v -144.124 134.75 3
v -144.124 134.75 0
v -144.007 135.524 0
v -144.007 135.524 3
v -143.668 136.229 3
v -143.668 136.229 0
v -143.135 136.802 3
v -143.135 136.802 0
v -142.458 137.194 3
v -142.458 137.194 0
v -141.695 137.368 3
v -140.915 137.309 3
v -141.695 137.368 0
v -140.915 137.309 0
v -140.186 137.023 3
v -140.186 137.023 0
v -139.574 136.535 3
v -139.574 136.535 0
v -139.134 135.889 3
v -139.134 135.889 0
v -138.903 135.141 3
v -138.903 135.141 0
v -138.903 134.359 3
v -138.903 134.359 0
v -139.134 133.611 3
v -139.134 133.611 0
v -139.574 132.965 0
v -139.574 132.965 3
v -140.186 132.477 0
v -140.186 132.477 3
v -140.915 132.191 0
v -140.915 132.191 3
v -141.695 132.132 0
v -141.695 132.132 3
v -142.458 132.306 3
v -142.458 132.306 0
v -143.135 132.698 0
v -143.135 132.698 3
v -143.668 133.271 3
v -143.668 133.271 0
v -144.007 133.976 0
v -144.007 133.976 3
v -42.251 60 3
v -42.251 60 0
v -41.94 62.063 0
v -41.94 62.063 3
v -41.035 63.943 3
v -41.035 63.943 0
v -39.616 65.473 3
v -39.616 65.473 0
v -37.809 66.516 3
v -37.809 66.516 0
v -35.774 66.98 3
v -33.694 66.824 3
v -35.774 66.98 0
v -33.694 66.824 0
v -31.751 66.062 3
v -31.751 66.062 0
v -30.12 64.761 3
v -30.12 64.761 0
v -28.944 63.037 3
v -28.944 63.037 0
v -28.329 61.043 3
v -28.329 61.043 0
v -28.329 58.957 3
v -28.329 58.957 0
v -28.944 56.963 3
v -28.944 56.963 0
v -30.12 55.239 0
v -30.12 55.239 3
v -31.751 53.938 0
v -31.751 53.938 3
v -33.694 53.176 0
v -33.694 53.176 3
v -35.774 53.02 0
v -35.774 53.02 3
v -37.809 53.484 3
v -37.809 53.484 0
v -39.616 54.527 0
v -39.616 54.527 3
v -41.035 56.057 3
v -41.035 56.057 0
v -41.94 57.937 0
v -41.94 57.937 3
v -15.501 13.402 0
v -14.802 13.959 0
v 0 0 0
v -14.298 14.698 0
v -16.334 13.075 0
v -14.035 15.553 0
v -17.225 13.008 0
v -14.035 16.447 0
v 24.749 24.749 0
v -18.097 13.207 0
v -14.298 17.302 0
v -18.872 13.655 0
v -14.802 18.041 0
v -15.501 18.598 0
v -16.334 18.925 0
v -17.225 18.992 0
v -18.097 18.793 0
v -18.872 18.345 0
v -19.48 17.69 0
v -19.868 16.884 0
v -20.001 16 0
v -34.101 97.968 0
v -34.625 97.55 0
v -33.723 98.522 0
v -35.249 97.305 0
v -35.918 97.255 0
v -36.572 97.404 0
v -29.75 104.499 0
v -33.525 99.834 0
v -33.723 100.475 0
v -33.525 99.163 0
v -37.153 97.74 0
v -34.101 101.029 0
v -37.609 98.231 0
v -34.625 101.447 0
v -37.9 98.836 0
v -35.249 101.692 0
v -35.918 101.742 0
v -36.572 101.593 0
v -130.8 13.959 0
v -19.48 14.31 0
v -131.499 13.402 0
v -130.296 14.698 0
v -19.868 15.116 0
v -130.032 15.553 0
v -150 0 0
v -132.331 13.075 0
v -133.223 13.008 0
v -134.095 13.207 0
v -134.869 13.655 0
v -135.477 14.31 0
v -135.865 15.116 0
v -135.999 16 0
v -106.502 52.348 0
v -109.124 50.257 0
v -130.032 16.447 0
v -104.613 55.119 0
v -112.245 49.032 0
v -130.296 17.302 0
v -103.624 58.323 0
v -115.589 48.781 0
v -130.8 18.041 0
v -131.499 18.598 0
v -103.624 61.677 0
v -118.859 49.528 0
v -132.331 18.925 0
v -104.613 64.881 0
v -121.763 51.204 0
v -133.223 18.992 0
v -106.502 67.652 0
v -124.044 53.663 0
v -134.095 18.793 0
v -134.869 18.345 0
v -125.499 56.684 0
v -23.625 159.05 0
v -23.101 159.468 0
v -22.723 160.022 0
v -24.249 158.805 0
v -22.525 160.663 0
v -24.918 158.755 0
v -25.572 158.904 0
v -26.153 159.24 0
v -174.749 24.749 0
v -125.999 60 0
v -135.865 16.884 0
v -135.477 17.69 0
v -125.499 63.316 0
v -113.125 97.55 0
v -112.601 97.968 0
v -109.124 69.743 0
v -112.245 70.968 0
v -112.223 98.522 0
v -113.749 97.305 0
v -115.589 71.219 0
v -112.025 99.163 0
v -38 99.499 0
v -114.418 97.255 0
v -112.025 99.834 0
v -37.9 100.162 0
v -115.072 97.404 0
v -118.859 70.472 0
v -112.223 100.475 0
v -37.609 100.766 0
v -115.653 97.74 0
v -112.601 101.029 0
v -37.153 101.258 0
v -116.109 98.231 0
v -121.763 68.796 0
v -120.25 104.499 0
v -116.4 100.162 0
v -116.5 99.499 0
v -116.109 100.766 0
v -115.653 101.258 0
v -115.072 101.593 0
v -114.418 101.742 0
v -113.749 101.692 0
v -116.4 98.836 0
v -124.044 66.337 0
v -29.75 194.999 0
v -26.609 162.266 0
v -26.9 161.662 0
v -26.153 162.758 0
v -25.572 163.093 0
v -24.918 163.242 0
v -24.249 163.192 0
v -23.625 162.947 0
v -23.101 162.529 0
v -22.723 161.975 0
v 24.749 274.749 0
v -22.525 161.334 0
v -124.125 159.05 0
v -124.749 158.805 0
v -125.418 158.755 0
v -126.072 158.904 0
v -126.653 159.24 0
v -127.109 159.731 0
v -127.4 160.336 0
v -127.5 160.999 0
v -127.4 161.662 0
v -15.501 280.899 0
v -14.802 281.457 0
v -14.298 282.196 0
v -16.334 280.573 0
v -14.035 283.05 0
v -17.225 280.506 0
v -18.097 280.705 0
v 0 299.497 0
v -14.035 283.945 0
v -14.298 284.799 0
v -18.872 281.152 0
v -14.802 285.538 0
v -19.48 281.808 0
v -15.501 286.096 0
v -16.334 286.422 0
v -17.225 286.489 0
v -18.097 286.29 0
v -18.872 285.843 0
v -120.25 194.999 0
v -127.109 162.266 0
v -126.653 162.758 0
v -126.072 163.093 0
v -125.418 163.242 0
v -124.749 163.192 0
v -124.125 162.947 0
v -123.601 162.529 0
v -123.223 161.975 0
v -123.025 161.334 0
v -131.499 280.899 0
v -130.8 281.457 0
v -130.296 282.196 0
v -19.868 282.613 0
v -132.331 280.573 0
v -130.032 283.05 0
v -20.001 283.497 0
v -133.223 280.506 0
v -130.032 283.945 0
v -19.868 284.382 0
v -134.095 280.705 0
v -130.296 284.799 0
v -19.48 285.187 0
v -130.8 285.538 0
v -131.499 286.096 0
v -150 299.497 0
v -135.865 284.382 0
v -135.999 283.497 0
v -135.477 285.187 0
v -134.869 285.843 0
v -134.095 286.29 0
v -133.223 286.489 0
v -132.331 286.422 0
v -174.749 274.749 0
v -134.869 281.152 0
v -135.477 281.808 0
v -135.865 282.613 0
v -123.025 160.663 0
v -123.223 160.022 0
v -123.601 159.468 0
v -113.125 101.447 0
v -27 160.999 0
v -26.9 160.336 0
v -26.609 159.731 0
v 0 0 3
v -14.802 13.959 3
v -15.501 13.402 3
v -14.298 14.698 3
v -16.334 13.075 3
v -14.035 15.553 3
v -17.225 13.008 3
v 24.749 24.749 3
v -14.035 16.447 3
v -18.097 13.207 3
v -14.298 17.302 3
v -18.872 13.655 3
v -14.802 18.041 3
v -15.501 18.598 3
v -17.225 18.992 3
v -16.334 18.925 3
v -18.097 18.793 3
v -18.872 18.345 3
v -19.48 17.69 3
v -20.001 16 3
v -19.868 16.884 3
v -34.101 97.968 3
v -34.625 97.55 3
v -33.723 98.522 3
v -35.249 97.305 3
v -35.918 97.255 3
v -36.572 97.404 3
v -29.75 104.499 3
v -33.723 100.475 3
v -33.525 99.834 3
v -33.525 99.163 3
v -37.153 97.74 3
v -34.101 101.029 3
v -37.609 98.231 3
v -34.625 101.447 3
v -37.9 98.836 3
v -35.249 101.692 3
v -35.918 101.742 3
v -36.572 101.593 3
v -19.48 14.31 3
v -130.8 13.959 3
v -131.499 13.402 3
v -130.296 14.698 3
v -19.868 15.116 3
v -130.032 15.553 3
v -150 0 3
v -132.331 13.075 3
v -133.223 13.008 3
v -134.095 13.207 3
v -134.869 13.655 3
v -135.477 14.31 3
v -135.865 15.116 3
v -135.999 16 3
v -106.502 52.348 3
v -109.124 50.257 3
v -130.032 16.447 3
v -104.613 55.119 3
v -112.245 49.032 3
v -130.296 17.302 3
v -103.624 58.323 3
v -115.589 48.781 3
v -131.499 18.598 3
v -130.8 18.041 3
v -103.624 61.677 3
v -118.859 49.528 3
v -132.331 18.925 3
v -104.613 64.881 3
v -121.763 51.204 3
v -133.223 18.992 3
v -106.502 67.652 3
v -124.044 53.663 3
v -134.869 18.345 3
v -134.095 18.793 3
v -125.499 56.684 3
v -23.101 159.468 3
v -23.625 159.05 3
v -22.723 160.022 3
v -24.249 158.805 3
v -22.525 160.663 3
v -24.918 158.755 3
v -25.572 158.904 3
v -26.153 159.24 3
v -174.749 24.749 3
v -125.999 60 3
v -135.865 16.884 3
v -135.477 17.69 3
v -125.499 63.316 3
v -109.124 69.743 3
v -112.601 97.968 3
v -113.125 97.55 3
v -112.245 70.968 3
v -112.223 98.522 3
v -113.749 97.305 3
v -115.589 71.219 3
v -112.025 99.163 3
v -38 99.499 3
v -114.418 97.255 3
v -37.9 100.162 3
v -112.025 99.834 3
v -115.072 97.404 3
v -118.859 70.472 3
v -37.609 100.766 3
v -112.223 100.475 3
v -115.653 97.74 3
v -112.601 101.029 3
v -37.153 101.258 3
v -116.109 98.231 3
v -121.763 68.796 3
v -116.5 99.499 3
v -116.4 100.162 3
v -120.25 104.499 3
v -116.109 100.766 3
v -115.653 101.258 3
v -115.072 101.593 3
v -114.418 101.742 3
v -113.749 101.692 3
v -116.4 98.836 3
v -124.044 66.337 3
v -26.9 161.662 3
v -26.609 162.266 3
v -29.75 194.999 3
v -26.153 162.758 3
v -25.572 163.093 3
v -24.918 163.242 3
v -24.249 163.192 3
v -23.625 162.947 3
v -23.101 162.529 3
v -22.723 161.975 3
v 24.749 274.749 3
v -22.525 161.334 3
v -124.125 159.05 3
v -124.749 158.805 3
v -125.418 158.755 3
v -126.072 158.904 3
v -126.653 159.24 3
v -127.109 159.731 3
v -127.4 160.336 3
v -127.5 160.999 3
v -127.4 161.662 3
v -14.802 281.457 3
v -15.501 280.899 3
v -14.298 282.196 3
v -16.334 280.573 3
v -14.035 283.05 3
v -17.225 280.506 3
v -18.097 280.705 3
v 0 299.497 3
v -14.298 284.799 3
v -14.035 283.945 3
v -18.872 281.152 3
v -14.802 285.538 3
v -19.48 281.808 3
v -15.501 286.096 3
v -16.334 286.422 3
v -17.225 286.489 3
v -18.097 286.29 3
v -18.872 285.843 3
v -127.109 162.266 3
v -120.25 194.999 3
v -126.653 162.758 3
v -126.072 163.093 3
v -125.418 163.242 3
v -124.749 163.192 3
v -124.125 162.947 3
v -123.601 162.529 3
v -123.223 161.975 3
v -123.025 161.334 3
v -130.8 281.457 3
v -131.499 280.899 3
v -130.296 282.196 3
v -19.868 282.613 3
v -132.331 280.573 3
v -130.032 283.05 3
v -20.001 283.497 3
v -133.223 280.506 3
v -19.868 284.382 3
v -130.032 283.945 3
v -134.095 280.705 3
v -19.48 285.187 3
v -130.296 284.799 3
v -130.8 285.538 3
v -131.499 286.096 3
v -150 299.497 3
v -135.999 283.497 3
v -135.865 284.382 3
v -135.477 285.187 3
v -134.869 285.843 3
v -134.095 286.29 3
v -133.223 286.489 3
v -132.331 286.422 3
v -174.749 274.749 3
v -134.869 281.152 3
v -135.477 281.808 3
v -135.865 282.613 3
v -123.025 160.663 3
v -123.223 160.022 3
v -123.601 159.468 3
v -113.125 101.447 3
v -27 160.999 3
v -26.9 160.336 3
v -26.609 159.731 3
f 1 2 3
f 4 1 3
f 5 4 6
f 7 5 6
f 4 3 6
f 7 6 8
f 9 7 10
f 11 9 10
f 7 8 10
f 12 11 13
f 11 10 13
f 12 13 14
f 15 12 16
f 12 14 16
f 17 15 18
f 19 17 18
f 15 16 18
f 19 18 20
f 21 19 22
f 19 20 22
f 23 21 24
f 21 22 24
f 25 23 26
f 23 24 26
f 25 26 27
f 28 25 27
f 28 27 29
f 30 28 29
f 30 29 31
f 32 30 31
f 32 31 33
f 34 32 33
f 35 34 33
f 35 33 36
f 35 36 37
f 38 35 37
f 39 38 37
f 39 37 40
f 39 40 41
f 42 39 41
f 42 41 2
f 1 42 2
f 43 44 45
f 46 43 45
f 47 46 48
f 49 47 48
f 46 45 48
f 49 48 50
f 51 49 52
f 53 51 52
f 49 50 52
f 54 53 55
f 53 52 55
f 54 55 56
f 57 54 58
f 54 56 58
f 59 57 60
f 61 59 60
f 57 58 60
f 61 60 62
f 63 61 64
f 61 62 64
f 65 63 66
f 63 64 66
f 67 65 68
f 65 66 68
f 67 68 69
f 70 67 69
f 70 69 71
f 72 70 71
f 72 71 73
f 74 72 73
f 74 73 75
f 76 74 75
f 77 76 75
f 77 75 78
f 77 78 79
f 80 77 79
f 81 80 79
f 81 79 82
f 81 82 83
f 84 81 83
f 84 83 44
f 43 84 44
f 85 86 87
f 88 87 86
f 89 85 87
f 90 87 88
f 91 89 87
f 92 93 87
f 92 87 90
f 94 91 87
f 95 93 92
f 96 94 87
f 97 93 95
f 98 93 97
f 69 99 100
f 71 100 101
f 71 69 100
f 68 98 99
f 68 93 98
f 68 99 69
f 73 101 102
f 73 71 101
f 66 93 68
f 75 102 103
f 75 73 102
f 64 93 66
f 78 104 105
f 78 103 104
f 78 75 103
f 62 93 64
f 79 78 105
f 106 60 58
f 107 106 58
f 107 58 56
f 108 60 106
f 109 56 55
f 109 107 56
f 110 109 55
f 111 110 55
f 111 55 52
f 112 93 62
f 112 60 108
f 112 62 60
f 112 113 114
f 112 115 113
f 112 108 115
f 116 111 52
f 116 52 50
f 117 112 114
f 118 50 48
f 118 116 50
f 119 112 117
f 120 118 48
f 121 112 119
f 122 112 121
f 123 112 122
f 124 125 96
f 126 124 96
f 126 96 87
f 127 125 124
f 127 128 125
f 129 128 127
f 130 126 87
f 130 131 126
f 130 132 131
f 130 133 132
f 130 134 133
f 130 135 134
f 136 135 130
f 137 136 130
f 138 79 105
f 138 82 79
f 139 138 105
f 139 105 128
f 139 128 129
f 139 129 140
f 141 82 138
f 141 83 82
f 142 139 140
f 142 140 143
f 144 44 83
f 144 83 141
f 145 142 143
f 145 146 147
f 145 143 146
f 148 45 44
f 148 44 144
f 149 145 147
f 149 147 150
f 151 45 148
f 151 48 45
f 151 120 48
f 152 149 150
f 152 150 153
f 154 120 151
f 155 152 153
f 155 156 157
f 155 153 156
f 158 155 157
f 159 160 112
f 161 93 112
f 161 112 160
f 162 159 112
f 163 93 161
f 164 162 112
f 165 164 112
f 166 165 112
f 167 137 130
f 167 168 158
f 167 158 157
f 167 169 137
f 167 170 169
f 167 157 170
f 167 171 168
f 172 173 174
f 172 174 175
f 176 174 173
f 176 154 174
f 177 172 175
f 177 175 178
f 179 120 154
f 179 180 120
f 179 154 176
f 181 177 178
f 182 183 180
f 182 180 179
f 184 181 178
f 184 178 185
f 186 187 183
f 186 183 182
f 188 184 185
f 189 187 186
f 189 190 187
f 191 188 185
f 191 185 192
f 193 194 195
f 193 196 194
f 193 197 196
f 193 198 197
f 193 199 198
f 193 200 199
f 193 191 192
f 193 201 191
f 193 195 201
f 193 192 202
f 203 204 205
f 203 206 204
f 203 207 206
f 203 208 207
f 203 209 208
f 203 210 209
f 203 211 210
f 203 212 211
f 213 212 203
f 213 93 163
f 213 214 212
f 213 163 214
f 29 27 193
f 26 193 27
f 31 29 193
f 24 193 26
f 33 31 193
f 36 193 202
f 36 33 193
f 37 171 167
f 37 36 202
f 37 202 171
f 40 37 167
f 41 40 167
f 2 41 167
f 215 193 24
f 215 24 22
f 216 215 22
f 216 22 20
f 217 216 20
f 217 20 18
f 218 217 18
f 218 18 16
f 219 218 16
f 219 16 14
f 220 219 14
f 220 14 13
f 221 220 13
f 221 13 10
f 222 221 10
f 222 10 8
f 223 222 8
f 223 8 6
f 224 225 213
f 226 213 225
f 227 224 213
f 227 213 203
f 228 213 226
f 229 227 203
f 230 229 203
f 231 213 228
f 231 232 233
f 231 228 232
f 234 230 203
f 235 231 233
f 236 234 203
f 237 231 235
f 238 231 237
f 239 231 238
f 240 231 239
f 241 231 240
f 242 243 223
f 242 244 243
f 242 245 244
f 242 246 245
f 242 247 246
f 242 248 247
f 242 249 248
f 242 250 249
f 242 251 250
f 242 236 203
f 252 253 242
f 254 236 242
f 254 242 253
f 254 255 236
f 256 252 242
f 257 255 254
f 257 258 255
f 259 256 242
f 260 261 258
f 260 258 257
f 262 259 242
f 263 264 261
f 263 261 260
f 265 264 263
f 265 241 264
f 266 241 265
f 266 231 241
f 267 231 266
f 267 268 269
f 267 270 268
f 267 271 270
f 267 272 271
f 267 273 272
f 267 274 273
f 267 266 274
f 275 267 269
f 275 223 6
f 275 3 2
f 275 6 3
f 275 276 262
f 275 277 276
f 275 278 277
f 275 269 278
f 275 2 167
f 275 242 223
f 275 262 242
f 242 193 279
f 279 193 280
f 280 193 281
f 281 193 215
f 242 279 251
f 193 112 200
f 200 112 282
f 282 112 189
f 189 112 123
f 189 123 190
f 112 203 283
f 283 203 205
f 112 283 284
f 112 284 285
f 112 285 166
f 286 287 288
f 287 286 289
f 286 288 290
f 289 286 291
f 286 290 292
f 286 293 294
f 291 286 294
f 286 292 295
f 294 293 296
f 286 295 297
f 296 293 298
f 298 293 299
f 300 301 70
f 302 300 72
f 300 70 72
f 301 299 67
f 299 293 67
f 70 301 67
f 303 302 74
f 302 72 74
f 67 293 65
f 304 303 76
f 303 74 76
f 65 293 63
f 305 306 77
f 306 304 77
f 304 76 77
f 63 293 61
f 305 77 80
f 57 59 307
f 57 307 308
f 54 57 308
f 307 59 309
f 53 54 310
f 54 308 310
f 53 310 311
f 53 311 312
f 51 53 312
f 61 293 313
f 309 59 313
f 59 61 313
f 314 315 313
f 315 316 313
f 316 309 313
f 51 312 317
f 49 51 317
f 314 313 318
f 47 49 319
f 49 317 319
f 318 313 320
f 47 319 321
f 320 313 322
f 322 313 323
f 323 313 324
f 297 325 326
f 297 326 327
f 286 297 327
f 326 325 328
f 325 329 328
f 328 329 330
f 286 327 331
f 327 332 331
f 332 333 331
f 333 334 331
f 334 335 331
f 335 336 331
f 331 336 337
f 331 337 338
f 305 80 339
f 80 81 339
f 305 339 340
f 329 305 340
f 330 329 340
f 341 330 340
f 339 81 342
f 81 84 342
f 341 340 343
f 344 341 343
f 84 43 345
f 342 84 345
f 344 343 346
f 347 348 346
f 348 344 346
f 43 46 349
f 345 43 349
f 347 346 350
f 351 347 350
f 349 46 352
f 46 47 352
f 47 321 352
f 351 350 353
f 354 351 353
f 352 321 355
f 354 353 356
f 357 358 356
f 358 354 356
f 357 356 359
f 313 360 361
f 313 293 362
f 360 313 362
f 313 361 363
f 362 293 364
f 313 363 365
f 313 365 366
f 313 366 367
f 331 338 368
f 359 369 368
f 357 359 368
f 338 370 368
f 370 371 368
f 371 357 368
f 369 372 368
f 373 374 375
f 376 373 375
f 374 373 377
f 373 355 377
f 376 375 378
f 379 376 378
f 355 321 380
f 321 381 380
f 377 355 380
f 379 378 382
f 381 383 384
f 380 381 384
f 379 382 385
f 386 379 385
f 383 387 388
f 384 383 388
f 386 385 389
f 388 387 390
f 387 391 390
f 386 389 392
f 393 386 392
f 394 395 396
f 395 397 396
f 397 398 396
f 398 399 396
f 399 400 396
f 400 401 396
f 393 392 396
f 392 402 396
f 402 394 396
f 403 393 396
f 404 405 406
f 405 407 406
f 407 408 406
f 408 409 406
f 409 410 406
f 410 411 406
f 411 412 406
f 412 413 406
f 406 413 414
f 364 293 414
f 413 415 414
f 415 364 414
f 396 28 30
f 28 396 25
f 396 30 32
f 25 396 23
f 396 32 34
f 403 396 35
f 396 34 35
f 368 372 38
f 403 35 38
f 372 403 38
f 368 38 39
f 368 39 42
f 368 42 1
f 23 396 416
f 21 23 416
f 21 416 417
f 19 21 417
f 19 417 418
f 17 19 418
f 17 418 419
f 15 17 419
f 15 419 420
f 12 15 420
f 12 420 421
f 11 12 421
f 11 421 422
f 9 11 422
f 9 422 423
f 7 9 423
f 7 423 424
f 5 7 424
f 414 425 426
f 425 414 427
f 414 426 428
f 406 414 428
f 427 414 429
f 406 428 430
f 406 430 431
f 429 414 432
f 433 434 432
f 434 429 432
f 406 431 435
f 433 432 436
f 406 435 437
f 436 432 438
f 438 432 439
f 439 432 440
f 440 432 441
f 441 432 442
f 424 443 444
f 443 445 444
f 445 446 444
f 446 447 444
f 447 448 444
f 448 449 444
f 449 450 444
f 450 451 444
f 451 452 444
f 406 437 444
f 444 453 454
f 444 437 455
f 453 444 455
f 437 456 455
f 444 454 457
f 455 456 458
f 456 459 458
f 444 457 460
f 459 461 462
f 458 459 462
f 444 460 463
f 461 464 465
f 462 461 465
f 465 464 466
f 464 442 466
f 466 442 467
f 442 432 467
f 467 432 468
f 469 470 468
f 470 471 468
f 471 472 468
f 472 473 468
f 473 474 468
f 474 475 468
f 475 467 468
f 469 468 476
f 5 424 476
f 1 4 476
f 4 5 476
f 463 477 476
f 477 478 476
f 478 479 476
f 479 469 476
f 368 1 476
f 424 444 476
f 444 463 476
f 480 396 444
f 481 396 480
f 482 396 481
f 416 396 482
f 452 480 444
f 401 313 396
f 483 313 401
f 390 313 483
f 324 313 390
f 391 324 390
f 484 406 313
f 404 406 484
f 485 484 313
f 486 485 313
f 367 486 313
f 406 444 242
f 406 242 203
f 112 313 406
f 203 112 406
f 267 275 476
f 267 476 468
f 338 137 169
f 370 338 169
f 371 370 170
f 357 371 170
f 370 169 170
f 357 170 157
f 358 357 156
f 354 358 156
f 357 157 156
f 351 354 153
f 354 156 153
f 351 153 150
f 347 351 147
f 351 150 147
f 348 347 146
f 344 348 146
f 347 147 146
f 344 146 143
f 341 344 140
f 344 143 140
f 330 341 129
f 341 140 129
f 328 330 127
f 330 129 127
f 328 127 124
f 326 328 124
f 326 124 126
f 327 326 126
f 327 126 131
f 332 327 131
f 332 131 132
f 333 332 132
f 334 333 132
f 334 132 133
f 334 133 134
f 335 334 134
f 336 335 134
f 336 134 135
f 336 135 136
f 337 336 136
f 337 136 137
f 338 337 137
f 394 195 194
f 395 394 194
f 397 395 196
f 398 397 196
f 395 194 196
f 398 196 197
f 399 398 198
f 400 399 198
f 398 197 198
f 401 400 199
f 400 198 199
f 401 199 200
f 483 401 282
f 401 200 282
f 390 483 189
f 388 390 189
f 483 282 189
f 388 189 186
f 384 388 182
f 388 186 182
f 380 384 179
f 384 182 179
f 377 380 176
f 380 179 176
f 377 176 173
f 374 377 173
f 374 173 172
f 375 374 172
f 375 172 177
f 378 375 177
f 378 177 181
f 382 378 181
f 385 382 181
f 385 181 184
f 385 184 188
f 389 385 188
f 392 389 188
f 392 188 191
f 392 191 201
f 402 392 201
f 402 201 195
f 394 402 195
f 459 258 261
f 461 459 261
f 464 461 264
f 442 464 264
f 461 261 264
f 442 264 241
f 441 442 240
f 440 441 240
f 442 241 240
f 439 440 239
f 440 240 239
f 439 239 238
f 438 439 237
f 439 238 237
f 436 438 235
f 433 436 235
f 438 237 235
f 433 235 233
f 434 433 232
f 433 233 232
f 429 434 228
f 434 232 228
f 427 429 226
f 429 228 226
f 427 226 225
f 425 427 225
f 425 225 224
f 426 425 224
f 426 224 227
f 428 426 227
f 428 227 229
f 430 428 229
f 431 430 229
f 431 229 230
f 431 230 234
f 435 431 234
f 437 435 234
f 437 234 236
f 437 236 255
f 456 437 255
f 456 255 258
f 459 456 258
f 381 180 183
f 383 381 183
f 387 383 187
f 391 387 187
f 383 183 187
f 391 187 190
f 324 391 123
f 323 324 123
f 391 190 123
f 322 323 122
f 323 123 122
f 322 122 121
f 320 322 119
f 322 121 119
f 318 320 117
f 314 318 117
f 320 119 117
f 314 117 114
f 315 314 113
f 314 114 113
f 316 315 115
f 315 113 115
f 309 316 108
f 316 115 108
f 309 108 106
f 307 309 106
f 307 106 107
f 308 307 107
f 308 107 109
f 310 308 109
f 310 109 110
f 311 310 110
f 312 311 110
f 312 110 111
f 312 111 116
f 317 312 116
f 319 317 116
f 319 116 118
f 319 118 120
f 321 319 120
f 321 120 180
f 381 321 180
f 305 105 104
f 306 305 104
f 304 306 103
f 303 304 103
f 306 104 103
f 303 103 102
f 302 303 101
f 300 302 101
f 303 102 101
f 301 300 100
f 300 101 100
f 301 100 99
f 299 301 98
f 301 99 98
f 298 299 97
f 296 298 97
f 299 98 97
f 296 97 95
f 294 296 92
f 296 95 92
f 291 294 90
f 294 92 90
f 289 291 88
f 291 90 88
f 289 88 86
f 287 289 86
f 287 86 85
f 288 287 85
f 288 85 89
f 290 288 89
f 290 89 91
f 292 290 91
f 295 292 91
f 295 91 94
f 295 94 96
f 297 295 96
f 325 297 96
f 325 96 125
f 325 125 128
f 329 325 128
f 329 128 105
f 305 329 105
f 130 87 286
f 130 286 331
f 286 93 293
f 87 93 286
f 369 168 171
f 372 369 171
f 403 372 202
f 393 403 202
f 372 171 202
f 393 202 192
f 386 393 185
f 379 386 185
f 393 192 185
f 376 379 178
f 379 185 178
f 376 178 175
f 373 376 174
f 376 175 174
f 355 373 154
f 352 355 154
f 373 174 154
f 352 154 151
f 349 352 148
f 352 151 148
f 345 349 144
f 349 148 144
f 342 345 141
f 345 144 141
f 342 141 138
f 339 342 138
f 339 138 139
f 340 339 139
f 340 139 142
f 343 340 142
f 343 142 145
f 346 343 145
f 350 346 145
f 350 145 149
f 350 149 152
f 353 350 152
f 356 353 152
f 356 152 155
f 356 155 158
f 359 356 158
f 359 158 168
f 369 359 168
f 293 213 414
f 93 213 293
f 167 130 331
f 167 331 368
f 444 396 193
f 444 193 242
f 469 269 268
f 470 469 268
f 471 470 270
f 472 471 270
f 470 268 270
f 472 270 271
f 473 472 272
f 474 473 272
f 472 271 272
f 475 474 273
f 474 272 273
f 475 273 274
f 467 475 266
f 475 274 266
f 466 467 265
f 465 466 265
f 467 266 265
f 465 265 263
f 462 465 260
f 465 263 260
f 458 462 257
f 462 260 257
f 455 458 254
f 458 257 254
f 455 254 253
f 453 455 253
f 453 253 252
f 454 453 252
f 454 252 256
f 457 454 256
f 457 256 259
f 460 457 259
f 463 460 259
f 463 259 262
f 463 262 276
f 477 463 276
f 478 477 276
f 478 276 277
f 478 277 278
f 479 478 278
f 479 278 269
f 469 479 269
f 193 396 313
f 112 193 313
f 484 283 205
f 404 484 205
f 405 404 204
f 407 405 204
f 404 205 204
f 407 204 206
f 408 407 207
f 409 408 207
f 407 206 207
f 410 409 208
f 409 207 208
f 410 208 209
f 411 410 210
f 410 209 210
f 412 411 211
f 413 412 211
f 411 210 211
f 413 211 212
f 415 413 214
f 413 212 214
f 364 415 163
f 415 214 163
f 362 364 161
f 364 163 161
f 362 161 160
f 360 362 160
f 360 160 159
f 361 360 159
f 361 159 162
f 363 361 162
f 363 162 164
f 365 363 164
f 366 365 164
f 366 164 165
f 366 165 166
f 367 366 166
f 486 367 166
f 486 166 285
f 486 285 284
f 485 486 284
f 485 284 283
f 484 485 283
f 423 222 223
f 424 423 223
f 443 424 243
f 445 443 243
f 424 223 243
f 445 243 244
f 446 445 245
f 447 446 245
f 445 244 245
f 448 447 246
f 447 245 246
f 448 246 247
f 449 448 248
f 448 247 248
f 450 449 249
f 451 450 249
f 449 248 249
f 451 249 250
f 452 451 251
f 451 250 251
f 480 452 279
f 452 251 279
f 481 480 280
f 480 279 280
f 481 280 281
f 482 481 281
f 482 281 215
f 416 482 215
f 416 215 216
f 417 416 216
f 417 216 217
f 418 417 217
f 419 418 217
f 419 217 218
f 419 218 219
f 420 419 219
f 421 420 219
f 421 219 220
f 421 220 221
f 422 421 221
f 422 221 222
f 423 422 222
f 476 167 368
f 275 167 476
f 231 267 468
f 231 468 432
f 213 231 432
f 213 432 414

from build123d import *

# Parameters (mm, degrees)
BASE_DEPTH              = 3
ESQUISSE2_R             = 3
ENL_V_MAT_EXTRU_1_DEPTH = 4
ENL_V_MAT_EXTRU_2_REACH = 5
ESQUISSE3_R             = 11.25
ESQUISSE3_R_2           = 7
ENL_V_MAT_EXTRU_3_REACH = 5
ESQUISSE4_R             = 2.625
ENL_V_MAT_EXTRU_4_REACH = 5
ESQUISSE5_W             = 90.5
ESQUISSE5_H             = 90.5
ESQUISSE6_R             = 2.25
ENL_V_MAT_EXTRU_5_DEPTH = 10


with BuildPart() as part:
    # Esquisse1 → Base (new body)
    with BuildSketch(Plane.XY):
        Polygon((24.748737342, 24.748737342), (0, 0), (-150, 0), (-174.748737342, 24.748737342), (-174.748737342, 274.748737342), (-150, 299.497474683), (0, 299.497474683), (24.748737342, 274.748737342), align=None)
    extrude(amount=BASE_DEPTH)

    # Esquisse2 → Enlèv. mat.-Extru.1 (cut, through all)
    with BuildSketch(Plane(origin=(0, 0, 0), x_dir=(-1, 0, 0), z_dir=(0, 0, -1))):
        with Locations((132.998737342, 283.497474683)):
            Circle(ESQUISSE2_R)
        with Locations((132.998737342, 16)):
            Circle(ESQUISSE2_R)
        with Locations((17.001262658, 16)):
            Circle(ESQUISSE2_R)
        with Locations((17.001262658, 283.497474683)):
            Circle(ESQUISSE2_R)
    extrude(amount=-ENL_V_MAT_EXTRU_1_DEPTH, mode=Mode.SUBTRACT)

    # Esquisse3 → Enlèv. mat.-Extru.2 (cut, up to next)
    with BuildSketch(Plane(origin=(0, 0, 0), x_dir=(-1, 0, 0), z_dir=(0, 0, -1)), mode=Mode.PRIVATE) as enl_v_mat_extru_2_sk1:
        with Locations((114.748737342, 60)):
            Circle(ESQUISSE3_R)
    enl_v_mat_extru_2_tool1 = extrude(enl_v_mat_extru_2_sk1.sketch, amount=-ENL_V_MAT_EXTRU_2_REACH, mode=Mode.PRIVATE) & part.part
    add(enl_v_mat_extru_2_tool1.solids().sort_by_distance((-114.748737, 60, 0))[0], mode=Mode.SUBTRACT)
    # Esquisse3 → Enlèv. mat.-Extru.2 (cut, up to next)
    with BuildSketch(Plane(origin=(0, 0, 0), x_dir=(-1, 0, 0), z_dir=(0, 0, -1)), mode=Mode.PRIVATE) as enl_v_mat_extru_2_sk2:
        with Locations((35.251262658, 60)):
            Circle(ESQUISSE3_R_2)
    enl_v_mat_extru_2_tool2 = extrude(enl_v_mat_extru_2_sk2.sketch, amount=-ENL_V_MAT_EXTRU_2_REACH, mode=Mode.PRIVATE) & part.part
    add(enl_v_mat_extru_2_tool2.solids().sort_by_distance((-35.251263, 60, 0))[0], mode=Mode.SUBTRACT)

    # Esquisse4 → Enlèv. mat.-Extru.3 (cut, up to next)
    with BuildSketch(Plane(origin=(0, 0, 0), x_dir=(-1, 0, 0), z_dir=(0, 0, -1)), mode=Mode.PRIVATE) as enl_v_mat_extru_3_sk1:
        with Locations((141.498737342, 134.75)):
            Circle(ESQUISSE4_R)
    enl_v_mat_extru_3_tool1 = extrude(enl_v_mat_extru_3_sk1.sketch, amount=-ENL_V_MAT_EXTRU_3_REACH, mode=Mode.PRIVATE) & part.part
    add(enl_v_mat_extru_3_tool1.solids().sort_by_distance((-141.498737, 134.75, 0))[0], mode=Mode.SUBTRACT)

    # Esquisse5 → Enlèv. mat.-Extru.4 (cut, up to next)
    with BuildSketch(Plane.XY.offset(3), mode=Mode.PRIVATE) as enl_v_mat_extru_4_sk1:
        with Locations((-75, 149.748737342)):
            Rectangle(ESQUISSE5_W, ESQUISSE5_H)
    enl_v_mat_extru_4_tool1 = extrude(enl_v_mat_extru_4_sk1.sketch, amount=-ENL_V_MAT_EXTRU_4_REACH, mode=Mode.PRIVATE) & part.part
    add(enl_v_mat_extru_4_tool1.solids().sort_by_distance((-75, 149.748737, 3))[0], mode=Mode.SUBTRACT)

    # Esquisse6 → Enlèv. mat.-Extru.5 (cut)
    with BuildSketch(Plane(origin=(0, 0, 0), x_dir=(-1, 0, 0), z_dir=(0, 0, -1))):
        with Locations((125.25, 160.998737342)):
            Circle(ESQUISSE6_R)
        with Locations((35.75, 99.498737342)):
            Circle(ESQUISSE6_R)
        with Locations((114.25, 99.498737342)):
            Circle(ESQUISSE6_R)
        with Locations((24.75, 160.998737342)):
            Circle(ESQUISSE6_R)
    extrude(amount=-ENL_V_MAT_EXTRU_5_DEPTH, mode=Mode.SUBTRACT)


solid = part.part
